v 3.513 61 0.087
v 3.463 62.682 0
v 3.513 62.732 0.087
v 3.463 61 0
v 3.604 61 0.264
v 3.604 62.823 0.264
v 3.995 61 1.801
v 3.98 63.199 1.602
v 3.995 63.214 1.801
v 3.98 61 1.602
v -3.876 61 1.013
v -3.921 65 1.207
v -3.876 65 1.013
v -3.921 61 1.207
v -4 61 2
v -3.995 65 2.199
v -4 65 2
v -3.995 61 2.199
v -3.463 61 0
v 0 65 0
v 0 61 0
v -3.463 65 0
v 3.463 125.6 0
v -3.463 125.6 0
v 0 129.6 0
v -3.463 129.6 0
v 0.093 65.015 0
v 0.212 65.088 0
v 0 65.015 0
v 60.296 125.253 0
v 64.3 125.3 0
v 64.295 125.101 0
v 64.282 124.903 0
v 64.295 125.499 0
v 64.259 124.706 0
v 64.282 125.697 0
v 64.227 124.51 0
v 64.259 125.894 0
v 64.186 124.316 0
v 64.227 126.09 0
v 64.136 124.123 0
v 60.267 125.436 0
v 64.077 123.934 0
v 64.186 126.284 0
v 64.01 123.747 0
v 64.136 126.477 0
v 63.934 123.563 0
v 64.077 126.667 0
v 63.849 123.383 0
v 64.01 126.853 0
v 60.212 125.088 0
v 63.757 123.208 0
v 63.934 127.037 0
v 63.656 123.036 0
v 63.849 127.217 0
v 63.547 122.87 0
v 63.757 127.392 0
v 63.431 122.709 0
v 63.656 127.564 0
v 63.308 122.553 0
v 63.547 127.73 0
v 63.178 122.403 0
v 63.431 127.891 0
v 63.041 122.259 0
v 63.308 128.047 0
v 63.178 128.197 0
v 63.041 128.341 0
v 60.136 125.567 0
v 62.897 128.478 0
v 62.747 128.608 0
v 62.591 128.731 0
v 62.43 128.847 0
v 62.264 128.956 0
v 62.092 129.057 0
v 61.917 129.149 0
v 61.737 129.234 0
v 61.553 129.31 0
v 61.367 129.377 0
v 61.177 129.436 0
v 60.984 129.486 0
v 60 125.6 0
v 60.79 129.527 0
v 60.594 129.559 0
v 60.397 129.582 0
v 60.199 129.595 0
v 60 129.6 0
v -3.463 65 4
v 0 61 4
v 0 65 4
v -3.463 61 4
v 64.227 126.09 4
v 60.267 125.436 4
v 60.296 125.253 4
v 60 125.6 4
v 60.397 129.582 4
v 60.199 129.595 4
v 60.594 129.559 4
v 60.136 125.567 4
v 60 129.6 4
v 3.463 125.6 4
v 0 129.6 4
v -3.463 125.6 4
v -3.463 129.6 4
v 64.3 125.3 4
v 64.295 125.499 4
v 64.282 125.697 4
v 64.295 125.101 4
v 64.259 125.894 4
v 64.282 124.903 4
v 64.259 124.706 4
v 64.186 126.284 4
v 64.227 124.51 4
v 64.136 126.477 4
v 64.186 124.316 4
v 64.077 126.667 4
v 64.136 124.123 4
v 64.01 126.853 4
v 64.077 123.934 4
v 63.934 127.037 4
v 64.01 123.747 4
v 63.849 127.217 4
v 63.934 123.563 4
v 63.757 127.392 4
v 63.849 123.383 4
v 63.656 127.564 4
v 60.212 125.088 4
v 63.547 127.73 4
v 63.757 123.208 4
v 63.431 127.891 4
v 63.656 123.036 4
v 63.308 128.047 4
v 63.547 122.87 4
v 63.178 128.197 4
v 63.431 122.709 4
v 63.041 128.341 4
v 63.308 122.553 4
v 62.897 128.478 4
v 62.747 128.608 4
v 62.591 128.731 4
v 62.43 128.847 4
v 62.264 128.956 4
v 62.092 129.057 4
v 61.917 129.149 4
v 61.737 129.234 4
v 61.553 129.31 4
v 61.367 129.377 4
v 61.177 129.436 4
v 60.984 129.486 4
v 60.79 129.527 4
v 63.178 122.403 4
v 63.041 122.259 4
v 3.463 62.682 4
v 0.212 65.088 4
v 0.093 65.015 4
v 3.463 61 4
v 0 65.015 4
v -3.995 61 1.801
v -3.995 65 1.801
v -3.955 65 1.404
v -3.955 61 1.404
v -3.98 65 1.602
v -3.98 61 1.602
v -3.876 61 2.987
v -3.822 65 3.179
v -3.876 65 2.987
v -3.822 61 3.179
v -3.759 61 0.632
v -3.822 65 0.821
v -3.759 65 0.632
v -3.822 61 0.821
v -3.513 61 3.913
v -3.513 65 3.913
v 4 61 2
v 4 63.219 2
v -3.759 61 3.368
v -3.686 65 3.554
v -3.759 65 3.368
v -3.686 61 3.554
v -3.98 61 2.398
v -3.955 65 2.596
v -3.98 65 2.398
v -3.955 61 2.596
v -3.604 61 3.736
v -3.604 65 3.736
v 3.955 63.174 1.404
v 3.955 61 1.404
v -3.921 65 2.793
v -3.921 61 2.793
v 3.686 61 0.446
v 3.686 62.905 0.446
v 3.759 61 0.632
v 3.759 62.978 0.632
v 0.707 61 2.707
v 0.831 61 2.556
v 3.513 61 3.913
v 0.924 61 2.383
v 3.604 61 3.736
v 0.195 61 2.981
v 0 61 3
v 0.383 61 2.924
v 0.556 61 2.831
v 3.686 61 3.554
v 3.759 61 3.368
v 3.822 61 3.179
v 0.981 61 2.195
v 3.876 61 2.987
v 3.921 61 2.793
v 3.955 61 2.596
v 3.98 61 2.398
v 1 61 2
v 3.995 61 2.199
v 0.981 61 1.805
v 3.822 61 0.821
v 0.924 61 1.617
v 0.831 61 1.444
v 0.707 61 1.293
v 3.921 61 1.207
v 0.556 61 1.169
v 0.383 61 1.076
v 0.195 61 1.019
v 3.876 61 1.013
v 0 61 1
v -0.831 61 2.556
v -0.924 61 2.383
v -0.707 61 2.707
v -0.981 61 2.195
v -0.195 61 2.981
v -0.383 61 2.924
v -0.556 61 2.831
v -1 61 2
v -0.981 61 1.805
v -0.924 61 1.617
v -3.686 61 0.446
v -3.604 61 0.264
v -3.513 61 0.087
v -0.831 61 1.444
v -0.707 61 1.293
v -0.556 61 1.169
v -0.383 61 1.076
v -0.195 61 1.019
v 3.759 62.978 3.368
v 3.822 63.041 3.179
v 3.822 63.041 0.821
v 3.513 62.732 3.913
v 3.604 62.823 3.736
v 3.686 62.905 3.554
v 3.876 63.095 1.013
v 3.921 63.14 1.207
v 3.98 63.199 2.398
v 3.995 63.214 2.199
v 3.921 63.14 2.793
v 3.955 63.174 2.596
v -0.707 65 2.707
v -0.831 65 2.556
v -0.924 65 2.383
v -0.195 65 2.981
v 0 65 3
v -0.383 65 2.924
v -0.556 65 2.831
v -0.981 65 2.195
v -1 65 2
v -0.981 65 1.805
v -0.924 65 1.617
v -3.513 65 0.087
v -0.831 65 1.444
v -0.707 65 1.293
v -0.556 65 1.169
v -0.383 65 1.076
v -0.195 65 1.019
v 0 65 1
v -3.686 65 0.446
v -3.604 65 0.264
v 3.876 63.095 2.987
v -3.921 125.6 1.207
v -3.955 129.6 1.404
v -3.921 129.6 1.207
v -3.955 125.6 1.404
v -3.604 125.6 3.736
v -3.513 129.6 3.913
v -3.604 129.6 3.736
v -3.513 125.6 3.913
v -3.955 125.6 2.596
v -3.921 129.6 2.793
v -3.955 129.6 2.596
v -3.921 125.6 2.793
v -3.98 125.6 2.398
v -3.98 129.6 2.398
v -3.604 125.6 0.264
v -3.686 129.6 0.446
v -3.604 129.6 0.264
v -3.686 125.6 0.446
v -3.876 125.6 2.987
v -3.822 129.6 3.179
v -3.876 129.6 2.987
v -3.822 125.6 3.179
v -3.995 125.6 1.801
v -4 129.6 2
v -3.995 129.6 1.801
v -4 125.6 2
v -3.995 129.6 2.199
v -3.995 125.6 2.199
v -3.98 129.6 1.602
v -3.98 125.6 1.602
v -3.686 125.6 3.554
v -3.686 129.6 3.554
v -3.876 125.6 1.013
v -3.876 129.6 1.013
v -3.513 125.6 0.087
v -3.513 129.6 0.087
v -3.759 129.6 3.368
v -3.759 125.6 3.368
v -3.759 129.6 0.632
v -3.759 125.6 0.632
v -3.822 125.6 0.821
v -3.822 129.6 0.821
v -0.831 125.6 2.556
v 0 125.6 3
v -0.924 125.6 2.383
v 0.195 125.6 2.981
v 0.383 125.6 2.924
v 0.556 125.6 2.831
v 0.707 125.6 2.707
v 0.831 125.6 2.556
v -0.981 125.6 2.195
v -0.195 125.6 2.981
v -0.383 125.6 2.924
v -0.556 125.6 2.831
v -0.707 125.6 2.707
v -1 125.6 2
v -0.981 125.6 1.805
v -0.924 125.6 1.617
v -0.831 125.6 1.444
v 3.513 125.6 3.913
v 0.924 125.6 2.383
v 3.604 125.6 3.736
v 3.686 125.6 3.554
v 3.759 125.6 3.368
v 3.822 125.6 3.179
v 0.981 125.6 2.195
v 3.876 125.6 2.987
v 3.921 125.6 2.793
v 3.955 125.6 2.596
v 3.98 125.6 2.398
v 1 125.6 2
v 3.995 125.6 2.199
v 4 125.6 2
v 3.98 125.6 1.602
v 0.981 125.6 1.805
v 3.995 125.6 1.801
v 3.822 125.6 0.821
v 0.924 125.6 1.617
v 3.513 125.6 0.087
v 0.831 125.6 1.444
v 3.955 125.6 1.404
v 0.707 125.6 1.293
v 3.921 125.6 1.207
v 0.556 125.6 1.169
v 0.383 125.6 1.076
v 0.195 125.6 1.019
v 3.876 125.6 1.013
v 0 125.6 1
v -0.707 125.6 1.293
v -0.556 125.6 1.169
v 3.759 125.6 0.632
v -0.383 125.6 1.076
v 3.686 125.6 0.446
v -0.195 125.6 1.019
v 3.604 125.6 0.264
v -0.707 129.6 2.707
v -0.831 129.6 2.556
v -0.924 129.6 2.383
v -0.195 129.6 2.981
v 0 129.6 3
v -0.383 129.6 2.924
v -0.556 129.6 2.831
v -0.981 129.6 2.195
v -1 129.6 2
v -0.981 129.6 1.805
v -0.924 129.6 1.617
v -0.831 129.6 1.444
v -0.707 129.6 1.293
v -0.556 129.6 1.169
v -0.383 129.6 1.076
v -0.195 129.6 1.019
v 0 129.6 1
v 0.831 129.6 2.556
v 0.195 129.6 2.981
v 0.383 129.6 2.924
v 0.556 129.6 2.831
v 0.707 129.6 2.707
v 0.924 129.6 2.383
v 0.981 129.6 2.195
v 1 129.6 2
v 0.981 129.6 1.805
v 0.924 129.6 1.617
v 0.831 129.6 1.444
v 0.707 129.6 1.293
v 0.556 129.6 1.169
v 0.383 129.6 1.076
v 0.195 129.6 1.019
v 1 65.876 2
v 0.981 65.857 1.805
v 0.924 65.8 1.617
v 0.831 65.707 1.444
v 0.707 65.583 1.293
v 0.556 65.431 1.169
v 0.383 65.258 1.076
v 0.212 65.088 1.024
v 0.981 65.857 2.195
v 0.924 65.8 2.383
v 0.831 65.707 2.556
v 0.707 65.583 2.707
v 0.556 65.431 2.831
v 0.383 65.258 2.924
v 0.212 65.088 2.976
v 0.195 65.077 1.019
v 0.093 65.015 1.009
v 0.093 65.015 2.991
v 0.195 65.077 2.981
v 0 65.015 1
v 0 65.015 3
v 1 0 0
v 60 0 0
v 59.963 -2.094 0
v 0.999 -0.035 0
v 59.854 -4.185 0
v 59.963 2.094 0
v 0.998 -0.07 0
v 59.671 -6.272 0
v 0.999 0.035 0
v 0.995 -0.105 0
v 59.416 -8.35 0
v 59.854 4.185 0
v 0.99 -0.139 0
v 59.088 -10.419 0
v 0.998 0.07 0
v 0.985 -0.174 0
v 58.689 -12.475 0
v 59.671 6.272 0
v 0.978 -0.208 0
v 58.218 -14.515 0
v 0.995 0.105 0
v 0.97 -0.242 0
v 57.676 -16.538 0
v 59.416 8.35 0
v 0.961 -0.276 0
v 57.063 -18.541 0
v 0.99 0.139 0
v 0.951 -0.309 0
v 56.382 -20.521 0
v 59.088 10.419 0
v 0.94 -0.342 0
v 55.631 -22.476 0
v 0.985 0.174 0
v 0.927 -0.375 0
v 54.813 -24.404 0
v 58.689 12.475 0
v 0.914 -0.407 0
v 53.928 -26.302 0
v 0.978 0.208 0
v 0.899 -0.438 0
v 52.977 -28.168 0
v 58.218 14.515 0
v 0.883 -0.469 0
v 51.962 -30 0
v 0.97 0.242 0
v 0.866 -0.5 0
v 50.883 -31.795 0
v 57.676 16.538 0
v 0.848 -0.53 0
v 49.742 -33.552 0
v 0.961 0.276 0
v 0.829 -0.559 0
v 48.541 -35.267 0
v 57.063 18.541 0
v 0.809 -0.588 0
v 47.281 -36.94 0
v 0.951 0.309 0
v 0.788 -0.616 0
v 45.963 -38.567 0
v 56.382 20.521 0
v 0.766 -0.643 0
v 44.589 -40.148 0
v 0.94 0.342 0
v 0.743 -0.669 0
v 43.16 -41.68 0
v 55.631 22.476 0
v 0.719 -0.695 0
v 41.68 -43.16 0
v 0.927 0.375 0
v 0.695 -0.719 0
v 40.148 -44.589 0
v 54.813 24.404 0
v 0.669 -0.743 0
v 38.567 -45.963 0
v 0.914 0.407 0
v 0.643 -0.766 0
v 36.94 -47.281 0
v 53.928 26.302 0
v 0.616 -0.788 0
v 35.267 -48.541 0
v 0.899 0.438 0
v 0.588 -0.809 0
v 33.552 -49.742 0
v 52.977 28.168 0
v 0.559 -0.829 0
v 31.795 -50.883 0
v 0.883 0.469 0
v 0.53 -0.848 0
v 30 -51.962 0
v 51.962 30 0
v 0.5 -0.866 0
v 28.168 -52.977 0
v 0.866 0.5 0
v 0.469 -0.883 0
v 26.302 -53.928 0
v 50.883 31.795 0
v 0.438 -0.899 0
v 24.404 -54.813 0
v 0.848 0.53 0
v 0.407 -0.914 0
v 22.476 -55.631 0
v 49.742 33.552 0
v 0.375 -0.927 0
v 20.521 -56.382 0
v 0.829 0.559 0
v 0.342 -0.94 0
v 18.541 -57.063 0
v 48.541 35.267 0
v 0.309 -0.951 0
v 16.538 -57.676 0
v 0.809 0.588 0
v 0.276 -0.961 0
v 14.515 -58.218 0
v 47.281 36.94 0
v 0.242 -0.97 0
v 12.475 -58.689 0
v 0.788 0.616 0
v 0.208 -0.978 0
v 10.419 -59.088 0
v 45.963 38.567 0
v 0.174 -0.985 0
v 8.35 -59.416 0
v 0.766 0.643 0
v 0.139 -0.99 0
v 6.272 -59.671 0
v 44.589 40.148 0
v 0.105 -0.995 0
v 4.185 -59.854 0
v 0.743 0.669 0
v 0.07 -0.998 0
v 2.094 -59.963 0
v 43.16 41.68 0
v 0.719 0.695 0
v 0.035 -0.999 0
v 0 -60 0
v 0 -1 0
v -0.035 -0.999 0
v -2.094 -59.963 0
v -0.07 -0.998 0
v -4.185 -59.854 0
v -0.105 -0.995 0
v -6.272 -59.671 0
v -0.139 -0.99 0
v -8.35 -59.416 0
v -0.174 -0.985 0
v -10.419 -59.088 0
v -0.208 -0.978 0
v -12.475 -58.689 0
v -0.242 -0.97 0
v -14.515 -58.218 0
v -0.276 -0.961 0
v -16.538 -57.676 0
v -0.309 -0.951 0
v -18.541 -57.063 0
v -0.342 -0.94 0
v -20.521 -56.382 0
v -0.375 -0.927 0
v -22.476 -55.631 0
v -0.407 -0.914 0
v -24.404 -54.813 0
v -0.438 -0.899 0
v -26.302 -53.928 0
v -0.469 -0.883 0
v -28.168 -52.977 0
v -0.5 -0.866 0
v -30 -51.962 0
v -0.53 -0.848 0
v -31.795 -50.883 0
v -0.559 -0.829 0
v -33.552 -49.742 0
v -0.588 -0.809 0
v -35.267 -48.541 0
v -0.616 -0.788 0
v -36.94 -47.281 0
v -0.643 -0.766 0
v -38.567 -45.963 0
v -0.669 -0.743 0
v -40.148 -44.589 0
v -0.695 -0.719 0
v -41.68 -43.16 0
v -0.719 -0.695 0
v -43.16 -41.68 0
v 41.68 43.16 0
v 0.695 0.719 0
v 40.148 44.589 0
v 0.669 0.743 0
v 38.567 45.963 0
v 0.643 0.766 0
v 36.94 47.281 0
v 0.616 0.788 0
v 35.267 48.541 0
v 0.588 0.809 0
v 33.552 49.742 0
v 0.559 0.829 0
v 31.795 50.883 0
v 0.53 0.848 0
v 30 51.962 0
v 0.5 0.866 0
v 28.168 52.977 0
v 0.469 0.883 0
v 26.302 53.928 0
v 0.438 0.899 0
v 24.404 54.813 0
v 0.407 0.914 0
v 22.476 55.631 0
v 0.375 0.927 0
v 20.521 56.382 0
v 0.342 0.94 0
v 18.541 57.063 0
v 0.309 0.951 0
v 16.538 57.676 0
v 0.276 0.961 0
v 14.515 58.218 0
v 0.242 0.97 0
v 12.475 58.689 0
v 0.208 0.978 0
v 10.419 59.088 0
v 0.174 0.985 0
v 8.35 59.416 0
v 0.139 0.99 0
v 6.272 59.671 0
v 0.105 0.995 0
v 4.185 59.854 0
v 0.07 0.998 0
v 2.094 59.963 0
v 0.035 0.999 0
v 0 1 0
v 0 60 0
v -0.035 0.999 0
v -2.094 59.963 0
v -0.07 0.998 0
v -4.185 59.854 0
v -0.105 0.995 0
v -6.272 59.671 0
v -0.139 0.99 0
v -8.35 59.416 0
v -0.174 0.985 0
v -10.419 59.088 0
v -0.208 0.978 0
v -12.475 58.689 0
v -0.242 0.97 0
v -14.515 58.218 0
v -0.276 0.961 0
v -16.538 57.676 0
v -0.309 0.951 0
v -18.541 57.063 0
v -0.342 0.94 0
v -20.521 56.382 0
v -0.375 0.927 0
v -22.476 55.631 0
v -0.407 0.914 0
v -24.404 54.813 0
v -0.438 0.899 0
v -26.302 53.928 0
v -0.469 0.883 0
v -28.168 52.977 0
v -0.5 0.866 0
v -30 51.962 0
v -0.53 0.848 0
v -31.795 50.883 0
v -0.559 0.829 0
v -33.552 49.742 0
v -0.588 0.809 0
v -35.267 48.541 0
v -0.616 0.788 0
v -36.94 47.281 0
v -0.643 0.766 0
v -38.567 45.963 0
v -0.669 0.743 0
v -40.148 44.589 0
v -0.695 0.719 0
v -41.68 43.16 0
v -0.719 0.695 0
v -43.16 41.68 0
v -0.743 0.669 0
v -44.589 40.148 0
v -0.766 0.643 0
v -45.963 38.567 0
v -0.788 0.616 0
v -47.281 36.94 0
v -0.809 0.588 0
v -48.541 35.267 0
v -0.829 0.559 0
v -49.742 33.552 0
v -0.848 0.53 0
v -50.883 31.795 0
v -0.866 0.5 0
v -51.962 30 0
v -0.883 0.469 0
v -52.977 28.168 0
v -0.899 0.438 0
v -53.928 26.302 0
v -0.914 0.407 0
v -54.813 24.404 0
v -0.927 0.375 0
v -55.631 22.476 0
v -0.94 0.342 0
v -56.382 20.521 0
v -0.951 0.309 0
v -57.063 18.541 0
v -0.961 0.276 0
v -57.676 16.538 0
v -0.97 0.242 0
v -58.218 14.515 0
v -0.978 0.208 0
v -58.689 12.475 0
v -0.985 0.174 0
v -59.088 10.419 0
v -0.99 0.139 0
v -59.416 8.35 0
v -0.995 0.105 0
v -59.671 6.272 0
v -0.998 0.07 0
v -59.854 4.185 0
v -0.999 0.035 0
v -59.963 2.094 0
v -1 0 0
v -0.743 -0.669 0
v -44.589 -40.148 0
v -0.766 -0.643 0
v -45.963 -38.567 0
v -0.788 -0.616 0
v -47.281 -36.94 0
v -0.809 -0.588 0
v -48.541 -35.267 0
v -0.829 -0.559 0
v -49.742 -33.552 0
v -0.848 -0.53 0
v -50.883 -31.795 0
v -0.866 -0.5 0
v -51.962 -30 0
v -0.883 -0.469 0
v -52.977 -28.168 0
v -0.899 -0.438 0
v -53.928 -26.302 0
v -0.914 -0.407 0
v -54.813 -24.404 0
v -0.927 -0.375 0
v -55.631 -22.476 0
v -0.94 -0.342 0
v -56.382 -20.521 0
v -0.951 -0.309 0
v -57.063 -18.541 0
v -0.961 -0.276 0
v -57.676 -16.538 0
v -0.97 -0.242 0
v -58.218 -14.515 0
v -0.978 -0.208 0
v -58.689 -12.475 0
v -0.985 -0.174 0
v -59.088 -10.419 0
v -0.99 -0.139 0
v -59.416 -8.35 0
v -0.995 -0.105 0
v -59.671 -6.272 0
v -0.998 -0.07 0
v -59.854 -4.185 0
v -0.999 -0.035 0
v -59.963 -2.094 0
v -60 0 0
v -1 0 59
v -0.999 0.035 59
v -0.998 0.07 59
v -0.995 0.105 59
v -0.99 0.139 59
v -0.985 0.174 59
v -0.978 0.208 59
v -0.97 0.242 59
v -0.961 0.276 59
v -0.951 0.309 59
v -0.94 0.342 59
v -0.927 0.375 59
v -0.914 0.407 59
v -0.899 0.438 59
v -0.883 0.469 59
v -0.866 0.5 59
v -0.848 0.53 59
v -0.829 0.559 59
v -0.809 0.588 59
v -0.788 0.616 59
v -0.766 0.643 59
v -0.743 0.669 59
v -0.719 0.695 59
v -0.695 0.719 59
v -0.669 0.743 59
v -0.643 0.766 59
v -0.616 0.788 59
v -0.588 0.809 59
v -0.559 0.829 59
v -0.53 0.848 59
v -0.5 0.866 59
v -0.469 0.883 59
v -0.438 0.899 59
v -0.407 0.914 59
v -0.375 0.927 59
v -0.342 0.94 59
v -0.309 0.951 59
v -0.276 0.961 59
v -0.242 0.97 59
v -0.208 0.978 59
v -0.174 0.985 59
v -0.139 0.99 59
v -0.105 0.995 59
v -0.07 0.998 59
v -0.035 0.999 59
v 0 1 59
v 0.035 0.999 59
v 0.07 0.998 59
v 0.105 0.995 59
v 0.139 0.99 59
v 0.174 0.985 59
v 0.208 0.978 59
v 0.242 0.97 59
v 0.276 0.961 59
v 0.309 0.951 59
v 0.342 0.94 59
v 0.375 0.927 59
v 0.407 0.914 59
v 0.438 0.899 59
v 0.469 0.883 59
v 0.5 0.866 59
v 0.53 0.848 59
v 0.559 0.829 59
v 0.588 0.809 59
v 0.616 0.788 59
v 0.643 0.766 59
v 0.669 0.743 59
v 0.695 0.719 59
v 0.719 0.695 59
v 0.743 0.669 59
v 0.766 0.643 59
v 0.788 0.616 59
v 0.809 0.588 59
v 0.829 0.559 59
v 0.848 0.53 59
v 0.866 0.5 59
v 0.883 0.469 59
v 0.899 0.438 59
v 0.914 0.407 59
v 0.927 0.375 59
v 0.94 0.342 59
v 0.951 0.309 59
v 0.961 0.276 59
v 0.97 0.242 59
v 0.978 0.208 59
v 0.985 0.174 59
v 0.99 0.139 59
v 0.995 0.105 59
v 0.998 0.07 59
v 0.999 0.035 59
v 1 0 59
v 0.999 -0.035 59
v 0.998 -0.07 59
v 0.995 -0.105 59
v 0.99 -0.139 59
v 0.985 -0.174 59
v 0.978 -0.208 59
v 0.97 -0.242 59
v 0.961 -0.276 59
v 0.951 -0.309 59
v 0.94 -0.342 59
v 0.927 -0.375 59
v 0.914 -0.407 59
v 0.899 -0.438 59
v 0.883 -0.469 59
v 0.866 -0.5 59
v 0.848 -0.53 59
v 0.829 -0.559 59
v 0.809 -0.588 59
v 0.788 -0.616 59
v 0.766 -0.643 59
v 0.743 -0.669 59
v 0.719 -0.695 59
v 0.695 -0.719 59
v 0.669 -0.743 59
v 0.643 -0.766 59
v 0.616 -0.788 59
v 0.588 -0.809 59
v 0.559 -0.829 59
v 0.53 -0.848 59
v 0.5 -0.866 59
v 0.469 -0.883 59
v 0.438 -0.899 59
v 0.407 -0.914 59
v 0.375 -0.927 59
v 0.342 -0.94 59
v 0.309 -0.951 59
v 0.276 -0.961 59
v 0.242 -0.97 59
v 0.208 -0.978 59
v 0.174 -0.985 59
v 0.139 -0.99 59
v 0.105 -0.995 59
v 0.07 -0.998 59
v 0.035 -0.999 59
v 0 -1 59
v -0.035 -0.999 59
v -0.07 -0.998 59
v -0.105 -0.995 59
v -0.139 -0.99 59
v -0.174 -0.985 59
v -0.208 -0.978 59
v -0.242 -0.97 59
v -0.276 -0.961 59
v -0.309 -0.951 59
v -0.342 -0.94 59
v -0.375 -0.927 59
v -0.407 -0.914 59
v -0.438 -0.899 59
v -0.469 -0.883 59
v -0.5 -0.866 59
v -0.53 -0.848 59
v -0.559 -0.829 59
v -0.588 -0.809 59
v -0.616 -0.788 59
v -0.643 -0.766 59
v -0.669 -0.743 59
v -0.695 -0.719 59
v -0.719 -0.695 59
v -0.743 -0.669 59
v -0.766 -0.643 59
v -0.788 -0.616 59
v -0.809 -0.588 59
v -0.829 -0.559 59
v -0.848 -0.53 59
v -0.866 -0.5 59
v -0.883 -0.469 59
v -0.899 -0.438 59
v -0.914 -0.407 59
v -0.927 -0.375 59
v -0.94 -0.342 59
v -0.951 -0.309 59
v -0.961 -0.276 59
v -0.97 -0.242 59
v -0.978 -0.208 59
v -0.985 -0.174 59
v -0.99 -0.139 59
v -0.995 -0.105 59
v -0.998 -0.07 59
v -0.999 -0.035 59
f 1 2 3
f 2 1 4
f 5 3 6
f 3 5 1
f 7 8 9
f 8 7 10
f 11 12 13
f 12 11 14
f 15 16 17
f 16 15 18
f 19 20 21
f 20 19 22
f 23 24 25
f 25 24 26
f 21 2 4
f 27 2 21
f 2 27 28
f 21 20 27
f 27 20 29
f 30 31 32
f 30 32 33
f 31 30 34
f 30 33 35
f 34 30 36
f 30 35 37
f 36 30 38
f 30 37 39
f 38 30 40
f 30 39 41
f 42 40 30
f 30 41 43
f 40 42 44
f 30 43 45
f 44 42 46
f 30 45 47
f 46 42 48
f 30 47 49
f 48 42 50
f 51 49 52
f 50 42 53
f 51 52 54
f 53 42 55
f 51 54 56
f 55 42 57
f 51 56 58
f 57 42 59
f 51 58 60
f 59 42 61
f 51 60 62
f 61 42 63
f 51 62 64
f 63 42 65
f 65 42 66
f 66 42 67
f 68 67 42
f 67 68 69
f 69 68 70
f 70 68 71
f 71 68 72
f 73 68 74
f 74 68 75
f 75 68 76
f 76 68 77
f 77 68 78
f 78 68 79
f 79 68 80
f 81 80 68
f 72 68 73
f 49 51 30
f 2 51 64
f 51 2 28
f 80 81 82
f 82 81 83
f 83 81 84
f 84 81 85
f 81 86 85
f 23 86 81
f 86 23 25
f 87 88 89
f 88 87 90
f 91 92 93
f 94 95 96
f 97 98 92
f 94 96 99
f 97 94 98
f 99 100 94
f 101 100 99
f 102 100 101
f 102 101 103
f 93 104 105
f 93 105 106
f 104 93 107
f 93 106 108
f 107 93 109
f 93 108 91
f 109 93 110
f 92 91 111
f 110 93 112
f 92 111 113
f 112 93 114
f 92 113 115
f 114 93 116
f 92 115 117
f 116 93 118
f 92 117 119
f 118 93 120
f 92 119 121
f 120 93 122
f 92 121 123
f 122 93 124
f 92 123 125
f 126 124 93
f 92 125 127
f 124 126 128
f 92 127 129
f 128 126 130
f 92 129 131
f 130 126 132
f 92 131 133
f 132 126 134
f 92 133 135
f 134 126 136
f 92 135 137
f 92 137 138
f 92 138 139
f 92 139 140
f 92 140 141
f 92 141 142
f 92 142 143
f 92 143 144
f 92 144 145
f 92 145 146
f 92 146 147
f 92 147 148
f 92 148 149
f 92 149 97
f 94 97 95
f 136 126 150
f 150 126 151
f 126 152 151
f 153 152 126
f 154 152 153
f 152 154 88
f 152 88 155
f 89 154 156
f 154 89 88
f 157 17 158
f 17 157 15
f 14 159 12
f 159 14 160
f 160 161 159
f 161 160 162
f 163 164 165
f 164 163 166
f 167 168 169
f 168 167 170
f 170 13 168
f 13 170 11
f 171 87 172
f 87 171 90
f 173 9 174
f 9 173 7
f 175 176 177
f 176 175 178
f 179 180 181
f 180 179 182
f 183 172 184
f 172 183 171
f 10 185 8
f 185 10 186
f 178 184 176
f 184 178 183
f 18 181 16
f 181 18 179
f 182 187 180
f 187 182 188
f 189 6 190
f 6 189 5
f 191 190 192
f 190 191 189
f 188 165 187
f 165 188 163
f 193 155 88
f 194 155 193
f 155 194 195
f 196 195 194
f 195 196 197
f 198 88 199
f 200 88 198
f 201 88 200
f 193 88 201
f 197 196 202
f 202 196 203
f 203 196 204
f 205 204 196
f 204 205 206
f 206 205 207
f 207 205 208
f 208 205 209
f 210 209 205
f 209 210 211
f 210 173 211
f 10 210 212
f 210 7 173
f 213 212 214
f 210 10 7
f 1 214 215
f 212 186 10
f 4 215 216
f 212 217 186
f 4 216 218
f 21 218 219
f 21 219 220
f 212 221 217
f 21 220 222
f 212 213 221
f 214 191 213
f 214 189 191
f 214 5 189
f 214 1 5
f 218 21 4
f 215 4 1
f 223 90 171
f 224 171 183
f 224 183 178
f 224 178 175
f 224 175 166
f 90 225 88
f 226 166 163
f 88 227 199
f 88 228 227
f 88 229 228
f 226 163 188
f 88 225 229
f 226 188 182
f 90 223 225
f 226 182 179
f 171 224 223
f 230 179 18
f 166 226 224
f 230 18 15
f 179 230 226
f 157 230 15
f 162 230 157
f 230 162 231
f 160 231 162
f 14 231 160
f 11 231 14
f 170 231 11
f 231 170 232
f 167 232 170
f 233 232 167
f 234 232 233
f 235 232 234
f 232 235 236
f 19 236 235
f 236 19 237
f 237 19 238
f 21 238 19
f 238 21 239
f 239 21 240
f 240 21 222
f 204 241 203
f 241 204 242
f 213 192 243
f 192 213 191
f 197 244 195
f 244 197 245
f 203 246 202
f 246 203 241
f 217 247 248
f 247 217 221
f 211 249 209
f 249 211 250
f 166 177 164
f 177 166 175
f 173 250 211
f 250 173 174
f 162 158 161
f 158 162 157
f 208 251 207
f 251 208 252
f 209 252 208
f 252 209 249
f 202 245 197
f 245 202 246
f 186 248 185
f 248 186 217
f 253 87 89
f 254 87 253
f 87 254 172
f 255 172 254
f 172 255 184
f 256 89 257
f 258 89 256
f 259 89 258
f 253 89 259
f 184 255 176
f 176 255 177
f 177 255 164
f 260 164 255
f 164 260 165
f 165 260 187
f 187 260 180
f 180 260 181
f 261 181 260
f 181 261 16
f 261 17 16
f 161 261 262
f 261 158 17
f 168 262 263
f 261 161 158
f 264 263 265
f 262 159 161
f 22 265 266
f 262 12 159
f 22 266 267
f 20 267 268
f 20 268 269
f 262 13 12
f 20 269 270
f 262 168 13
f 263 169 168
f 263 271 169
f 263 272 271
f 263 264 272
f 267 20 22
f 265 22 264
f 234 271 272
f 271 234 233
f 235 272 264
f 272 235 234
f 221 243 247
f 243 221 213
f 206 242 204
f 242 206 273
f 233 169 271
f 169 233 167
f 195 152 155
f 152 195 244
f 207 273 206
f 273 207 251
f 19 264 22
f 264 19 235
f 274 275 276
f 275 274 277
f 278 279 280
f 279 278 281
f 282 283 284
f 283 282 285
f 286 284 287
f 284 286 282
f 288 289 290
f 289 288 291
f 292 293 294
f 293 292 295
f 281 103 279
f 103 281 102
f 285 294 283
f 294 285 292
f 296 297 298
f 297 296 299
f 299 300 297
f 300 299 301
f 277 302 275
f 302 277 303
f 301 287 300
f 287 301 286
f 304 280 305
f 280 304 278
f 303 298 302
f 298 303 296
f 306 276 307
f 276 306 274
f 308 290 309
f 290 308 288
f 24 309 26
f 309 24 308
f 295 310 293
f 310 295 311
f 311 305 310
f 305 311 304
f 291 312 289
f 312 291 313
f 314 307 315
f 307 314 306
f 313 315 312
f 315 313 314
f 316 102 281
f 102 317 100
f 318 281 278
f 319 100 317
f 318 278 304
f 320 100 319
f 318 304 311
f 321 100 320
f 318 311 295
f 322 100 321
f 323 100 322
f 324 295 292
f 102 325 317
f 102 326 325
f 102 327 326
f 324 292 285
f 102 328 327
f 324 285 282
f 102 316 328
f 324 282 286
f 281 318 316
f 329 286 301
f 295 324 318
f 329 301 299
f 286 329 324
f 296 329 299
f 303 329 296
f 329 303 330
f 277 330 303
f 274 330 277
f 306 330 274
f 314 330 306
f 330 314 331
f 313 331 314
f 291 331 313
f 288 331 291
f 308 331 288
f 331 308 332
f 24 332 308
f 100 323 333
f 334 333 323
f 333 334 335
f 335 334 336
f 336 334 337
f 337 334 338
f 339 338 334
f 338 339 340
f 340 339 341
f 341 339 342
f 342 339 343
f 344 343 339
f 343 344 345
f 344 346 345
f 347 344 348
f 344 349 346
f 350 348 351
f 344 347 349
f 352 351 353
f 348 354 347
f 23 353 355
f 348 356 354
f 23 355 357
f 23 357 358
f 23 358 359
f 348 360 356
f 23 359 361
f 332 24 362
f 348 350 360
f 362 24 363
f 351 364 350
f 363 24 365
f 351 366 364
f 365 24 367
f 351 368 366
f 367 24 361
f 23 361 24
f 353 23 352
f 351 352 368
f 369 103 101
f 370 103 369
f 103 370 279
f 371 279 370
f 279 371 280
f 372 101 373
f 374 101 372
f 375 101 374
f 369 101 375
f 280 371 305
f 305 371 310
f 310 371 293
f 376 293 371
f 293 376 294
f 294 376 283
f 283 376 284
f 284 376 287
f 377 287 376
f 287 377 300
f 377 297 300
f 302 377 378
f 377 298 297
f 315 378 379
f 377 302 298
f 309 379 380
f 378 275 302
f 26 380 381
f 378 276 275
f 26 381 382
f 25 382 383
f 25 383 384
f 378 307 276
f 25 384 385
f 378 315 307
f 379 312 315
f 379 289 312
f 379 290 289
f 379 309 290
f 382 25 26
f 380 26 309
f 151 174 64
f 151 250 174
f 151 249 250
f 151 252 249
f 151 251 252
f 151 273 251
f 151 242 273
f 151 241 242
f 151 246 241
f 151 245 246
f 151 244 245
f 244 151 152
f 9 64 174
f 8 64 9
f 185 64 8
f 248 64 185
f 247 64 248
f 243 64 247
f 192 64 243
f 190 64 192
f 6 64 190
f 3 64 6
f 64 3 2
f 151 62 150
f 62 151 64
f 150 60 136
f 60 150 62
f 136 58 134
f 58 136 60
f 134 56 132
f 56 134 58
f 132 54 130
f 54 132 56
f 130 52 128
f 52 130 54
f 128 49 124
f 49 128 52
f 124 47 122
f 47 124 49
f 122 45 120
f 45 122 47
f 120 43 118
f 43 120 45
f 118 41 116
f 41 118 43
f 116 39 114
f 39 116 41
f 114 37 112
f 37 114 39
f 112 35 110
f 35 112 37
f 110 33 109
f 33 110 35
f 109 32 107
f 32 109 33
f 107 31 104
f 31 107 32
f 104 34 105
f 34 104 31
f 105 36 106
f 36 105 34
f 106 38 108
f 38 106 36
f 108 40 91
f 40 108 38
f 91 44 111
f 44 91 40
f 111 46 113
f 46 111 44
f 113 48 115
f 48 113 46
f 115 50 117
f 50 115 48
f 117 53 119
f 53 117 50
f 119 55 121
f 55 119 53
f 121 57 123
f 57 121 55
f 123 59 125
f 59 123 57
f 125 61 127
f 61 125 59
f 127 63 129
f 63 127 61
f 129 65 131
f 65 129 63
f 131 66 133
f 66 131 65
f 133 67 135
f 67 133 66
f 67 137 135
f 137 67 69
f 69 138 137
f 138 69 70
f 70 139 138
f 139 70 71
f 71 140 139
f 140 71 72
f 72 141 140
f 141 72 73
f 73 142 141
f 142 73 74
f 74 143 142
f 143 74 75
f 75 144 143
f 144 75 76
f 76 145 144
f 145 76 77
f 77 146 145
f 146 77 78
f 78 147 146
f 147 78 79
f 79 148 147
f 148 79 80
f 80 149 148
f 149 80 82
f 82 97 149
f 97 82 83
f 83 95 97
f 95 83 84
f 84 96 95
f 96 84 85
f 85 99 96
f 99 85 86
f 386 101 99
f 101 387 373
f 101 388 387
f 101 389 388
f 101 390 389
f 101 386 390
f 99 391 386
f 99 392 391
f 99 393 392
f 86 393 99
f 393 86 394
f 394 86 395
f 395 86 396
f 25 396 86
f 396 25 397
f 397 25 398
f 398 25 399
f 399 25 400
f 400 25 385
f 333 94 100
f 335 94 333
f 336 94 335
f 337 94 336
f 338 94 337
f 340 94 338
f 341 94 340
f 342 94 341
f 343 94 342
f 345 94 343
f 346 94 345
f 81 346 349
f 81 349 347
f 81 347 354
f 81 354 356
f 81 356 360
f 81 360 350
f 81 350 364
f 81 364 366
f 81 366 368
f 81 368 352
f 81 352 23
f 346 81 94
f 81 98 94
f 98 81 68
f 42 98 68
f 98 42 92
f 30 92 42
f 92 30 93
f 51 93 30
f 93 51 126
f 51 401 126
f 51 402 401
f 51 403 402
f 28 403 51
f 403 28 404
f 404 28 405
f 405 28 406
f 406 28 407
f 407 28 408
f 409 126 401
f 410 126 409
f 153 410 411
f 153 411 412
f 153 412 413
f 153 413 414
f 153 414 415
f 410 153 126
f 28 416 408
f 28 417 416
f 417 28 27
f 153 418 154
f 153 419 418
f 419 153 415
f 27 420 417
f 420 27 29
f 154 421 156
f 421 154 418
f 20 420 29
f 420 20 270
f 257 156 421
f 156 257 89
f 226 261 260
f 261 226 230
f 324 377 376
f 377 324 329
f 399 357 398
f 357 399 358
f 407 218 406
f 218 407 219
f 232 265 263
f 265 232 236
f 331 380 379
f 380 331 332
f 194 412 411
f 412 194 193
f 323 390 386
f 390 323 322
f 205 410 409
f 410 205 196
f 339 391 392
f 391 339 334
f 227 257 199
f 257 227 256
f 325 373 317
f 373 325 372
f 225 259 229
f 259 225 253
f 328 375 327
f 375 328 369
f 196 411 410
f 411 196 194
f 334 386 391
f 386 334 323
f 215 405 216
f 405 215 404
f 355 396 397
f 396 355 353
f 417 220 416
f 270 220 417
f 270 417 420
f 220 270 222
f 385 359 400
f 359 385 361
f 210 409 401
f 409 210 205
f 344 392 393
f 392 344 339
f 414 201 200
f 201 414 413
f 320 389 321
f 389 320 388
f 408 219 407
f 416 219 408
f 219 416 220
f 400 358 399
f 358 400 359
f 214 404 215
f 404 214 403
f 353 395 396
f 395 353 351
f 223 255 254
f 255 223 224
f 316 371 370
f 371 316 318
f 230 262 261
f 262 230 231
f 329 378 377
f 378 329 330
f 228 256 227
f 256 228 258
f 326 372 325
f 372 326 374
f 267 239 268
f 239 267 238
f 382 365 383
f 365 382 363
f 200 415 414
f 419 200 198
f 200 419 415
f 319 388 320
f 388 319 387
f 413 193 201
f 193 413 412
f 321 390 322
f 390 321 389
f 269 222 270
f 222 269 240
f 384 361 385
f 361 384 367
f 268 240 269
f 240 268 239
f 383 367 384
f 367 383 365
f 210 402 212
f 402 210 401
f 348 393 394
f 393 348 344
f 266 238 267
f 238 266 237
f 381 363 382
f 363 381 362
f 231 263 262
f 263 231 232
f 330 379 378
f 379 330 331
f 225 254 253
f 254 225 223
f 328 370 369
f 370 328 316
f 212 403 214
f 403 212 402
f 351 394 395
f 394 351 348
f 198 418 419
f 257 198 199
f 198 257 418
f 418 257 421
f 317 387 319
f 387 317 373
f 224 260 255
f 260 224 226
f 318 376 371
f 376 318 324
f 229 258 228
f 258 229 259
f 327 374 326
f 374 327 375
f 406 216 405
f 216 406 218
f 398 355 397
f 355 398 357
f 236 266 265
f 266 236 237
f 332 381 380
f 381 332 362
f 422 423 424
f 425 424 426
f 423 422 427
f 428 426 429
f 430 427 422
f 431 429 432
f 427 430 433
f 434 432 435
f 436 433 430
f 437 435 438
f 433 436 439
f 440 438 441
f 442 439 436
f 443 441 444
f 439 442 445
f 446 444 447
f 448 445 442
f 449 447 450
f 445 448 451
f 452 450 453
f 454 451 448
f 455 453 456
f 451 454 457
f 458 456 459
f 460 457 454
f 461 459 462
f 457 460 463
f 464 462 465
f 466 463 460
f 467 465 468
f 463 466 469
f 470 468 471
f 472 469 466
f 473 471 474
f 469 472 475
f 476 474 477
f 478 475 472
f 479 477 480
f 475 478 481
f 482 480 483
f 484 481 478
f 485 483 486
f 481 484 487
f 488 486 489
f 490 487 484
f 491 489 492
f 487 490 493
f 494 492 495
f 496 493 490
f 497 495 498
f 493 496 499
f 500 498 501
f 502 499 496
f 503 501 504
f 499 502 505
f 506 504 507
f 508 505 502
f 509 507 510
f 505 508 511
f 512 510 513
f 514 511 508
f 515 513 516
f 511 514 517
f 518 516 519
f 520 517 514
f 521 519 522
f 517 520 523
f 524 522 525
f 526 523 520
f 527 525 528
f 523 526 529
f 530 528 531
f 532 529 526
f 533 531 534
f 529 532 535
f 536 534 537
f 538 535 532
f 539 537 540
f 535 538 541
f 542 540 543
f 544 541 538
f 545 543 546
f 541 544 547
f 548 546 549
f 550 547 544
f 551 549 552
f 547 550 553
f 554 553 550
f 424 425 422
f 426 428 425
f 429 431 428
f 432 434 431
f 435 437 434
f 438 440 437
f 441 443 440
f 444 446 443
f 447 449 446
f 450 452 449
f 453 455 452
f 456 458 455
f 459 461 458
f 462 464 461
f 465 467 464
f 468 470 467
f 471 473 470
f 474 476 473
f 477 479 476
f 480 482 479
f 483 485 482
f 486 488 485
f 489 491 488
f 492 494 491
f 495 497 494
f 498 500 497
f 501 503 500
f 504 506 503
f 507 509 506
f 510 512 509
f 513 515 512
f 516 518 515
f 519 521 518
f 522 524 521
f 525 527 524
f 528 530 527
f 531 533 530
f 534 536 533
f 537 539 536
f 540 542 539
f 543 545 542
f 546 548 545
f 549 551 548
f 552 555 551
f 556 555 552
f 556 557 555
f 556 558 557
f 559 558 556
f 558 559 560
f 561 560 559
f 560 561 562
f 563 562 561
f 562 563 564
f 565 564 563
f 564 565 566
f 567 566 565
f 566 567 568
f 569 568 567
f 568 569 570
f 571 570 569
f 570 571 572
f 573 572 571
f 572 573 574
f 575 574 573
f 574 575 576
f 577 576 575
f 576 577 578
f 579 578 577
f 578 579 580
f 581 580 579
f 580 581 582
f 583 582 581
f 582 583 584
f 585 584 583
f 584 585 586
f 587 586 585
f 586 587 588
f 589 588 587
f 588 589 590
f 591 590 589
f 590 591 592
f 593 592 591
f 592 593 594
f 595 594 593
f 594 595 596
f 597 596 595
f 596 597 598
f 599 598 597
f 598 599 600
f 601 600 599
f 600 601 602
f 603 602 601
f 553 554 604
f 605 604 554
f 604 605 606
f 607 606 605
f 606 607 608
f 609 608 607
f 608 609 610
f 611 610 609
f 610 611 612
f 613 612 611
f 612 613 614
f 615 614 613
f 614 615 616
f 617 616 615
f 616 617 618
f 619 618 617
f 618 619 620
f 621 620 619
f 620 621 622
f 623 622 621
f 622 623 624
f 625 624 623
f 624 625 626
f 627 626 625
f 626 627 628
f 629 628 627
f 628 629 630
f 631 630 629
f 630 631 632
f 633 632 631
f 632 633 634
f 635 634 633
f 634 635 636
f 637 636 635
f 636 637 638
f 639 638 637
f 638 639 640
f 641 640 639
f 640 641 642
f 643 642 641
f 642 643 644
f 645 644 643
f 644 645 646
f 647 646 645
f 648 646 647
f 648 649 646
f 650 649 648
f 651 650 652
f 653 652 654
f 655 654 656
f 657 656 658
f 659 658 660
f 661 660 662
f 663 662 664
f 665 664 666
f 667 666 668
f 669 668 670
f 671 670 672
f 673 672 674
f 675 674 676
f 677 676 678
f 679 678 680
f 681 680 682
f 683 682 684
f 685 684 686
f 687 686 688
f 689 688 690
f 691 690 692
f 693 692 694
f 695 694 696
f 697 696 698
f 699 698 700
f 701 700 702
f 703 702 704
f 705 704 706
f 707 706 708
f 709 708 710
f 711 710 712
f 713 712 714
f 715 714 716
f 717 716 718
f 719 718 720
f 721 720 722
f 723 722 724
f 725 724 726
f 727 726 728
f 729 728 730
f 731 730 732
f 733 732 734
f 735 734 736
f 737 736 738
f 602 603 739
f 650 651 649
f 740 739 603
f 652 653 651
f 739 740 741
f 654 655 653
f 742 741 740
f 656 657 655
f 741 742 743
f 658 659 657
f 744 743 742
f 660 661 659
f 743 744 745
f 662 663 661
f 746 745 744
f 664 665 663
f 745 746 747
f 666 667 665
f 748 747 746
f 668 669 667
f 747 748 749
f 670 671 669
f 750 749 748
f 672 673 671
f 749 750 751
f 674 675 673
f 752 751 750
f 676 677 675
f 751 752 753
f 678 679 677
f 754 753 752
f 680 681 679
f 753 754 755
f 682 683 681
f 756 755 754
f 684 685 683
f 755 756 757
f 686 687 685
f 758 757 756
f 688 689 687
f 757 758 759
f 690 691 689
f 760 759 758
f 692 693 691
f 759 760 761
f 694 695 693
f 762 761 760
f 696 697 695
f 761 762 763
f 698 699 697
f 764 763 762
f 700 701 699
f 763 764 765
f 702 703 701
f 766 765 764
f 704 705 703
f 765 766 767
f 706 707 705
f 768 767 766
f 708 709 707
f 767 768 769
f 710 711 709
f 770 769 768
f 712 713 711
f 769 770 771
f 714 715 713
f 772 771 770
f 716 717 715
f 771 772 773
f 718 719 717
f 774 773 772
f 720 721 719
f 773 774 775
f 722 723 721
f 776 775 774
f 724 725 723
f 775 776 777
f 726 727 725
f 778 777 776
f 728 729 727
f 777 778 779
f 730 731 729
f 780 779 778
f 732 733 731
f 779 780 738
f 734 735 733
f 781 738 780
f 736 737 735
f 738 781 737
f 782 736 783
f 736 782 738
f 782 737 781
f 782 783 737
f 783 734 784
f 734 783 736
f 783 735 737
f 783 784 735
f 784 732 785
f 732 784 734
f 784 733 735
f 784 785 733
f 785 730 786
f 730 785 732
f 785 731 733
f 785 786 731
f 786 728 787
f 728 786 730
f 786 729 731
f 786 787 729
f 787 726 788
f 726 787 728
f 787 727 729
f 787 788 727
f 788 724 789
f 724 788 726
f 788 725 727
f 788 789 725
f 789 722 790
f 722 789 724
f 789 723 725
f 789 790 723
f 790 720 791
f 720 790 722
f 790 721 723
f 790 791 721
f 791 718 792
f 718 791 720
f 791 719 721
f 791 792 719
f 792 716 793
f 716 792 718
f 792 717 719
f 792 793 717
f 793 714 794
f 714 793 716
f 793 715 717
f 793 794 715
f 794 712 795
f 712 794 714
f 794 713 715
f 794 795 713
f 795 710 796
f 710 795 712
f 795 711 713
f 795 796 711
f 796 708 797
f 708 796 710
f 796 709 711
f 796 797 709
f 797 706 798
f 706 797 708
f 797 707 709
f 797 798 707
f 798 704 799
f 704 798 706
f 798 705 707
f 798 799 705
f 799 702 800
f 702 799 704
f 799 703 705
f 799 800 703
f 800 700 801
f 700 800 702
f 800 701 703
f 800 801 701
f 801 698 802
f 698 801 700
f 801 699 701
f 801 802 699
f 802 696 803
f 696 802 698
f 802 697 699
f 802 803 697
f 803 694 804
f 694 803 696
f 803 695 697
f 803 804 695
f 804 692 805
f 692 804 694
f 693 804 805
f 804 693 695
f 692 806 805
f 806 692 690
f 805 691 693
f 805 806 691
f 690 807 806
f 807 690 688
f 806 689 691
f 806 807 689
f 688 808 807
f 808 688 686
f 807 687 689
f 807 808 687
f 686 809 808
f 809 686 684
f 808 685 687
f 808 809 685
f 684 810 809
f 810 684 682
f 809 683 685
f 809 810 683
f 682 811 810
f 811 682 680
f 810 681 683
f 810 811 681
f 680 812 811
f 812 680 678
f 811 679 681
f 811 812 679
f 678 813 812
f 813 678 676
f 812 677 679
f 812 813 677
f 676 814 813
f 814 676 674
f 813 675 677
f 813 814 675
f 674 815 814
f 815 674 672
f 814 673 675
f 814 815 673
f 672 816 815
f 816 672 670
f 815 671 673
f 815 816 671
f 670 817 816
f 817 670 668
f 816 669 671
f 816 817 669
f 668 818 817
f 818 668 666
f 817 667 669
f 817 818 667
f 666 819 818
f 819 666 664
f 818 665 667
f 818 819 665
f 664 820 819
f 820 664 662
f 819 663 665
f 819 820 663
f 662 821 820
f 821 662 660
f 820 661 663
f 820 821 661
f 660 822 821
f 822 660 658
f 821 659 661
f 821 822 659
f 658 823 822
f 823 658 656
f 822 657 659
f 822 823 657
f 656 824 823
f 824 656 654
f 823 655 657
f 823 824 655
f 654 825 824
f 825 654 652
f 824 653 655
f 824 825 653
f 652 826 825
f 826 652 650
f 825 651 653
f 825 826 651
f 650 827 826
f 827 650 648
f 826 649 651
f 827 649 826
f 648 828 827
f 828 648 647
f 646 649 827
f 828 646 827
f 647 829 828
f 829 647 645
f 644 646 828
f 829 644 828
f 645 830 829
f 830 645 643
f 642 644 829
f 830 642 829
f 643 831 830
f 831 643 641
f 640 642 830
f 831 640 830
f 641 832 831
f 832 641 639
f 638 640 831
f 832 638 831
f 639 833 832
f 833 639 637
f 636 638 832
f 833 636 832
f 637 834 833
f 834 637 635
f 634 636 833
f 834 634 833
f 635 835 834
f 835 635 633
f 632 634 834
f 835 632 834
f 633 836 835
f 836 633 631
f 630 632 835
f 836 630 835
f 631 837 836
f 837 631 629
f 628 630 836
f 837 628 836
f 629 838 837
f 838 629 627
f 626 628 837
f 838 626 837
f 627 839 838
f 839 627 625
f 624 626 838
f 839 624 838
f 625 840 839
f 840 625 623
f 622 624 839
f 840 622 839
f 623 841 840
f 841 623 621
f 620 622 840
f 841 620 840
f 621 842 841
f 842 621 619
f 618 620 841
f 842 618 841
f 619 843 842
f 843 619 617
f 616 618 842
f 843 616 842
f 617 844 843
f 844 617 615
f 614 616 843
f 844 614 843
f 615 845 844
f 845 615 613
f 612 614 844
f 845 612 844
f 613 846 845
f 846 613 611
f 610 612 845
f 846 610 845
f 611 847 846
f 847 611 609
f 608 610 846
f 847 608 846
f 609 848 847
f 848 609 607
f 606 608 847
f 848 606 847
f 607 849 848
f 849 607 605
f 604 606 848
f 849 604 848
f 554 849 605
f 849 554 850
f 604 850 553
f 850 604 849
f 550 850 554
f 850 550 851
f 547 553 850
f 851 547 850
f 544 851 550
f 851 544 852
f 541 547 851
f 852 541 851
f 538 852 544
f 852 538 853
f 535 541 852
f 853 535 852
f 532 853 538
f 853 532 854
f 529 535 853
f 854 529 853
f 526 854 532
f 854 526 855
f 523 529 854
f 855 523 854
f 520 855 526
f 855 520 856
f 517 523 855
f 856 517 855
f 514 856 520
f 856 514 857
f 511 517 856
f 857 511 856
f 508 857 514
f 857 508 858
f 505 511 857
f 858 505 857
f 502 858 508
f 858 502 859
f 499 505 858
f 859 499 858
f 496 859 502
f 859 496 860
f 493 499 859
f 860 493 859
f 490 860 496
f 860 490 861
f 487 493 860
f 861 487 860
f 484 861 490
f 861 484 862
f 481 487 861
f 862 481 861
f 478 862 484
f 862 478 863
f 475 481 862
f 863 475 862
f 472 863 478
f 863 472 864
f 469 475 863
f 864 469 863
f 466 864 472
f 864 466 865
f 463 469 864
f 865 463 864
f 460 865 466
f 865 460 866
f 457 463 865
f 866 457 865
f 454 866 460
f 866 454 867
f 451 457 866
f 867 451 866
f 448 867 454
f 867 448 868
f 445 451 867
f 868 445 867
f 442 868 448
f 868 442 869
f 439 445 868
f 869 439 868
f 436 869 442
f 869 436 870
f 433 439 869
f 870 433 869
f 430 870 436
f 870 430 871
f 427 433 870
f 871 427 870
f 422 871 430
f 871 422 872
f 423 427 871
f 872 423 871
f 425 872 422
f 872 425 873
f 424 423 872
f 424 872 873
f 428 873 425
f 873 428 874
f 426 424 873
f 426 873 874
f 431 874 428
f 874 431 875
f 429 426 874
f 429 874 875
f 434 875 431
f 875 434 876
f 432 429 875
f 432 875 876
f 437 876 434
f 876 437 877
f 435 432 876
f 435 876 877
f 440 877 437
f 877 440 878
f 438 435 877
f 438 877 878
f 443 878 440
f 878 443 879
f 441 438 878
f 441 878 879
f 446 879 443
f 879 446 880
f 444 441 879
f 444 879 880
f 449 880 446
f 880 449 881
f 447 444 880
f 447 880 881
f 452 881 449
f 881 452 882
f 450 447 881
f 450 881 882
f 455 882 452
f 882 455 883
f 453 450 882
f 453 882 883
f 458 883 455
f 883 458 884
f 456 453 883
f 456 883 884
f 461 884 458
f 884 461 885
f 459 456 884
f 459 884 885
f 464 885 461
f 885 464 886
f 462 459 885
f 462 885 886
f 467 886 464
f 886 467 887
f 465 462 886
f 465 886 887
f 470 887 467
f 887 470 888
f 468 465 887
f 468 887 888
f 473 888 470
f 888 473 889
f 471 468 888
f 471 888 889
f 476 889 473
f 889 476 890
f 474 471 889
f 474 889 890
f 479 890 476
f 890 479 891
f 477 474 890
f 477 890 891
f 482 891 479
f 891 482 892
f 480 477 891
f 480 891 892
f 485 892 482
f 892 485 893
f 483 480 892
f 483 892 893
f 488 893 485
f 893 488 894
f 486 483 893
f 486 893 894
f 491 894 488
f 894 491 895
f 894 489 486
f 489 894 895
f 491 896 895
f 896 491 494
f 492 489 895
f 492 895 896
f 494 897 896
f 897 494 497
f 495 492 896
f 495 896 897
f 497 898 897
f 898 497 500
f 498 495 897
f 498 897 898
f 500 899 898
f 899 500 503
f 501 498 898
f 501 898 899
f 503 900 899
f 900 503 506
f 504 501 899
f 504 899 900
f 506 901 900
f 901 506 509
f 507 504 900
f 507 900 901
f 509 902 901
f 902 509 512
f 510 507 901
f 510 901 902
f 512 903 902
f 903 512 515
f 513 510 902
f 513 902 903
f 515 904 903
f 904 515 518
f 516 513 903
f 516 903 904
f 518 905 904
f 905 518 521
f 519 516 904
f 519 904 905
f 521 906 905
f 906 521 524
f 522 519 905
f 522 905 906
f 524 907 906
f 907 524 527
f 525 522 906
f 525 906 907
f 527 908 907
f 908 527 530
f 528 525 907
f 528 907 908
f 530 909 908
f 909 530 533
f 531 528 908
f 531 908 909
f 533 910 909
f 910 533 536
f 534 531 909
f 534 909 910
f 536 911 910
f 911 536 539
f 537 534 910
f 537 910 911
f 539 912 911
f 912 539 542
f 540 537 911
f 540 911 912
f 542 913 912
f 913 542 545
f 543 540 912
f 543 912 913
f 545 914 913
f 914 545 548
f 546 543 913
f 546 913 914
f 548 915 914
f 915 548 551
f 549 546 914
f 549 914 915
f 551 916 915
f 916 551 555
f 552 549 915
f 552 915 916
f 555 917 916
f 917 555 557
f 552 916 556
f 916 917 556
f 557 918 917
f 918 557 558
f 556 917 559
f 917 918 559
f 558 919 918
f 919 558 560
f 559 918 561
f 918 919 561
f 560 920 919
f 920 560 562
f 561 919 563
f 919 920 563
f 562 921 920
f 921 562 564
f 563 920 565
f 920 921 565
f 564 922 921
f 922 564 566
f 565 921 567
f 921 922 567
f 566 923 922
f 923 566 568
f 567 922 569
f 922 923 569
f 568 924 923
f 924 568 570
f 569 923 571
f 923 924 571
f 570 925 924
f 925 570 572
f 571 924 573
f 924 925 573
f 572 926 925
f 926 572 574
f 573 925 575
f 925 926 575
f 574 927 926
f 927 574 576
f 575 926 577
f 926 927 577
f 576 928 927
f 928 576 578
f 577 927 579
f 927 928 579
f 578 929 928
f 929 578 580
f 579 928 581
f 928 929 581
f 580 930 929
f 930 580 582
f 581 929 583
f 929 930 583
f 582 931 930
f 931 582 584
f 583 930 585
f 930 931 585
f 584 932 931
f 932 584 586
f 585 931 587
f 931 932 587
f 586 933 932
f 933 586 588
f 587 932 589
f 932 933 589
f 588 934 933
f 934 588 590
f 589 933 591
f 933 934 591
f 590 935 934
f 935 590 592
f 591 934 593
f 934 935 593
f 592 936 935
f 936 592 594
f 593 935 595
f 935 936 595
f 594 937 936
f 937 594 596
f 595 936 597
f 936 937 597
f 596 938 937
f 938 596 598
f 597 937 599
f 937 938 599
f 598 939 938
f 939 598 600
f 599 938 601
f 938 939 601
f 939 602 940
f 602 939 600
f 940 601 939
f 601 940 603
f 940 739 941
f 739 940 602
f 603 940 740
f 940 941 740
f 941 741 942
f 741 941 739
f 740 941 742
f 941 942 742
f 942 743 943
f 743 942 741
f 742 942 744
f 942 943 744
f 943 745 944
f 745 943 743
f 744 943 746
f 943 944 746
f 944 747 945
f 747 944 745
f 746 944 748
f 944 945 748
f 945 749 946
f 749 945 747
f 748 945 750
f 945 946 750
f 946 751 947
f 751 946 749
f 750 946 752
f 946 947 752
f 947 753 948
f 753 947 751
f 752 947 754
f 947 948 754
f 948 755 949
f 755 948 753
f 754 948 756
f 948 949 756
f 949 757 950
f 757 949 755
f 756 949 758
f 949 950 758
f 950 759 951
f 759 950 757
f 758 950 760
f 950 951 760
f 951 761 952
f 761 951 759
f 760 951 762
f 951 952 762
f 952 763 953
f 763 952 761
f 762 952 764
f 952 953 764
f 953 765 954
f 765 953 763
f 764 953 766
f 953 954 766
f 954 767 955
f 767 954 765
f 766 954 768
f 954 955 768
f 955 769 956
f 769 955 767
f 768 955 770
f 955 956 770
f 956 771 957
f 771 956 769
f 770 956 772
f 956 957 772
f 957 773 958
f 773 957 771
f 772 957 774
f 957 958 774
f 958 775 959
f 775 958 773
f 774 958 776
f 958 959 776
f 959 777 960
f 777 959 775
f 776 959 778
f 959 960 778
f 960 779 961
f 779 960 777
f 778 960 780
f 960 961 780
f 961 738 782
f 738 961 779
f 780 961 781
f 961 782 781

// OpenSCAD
// File revolution.scad
// Creates volumes of revolution from a function
// along with the matching curve
// both pieces have a hole for a wire to allow rotation
// (c) 2021-2022 Rich Cameron, for the book Make:Calculus
// Licensed under a Creative Commons, Attribution,
// CC-BY 4.0 international license, per
// https://creativecommons.org/licenses/by/4.0/
// Attribute to Rich Cameron, at
// repository github.com/whosawhatsis/Calculus

function f(x) = x;
//function f(x) = exp(x);
//function f(x) = pow(x, 1/3);

xmin = 0;
xmax = 2;
xunit = 30; //scale of x axis in mm

steps = 100;
flip = true;

wall = 4; //width of 2D line 
thick = 4; // thickness of 2D line
hole = 2; // size of pivot hole
clearance = .3; //clearance between 2D and 3D shape 

$fs = .2;
$fa = 2;

for (x = [xmin:(xmax - xmin) / steps:xmax]) assert(f(x) >= 0, "function must be positive for xmin <= x <= xmax");

translate([0, wall + clearance + 1 + xunit * max([for(x = [xmin:(xmax - xmin) / steps:xmax]) f(x)]), 0]) frame();
translate([0, 0, flip ? xunit * (xmax - xmin) : 0]) mirror([0, 0, flip ? 1 : 0]) revolution();

module shape() {
	translate([0, -xunit * xmin, 0]) polygon(xunit * concat([[0, xmax], [0, xmin]], [for (x = [xmin:(xmax - xmin) / steps:xmax]) [f(x), x]]));
}

module frame() translate([0, 0, thick / 2]) {
	difference() {
		union() {
			for(i = [0, 1]) translate([0, -clearance + i * (xunit * (xmax - xmin) + wall + clearance * 2), 0]) rotate([90, 0, 0]) linear_extrude(wall, convexity = 5) mirror([1, 0, 0]) intersection() {
				circle(wall);
				square([wall * 2, thick], center = true);
			};
			linear_extrude(thick, center = true, convexity = 5) difference() {
				offset(wall + clearance) shape();
				translate([0, -(wall + clearance + 1), 0]) mirror([1, 0, 0]) square([wall + clearance + 1, xunit * (xmax - xmin) + (wall + clearance + 1) * 2]);
				offset(clearance) shape();
			}
		}
		rotate([90, 0, 0]) cylinder(r = hole / 2, h = 1000, center = true);
	}
	#%linear_extrude(.1) shape();
}

module revolution(bottom = false) rotate_extrude() intersection() {
	mirror([0, bottom ? 1 : 0, 0]) shape();
	translate([hole / 2, 0, 0]) square(1000); 
}
